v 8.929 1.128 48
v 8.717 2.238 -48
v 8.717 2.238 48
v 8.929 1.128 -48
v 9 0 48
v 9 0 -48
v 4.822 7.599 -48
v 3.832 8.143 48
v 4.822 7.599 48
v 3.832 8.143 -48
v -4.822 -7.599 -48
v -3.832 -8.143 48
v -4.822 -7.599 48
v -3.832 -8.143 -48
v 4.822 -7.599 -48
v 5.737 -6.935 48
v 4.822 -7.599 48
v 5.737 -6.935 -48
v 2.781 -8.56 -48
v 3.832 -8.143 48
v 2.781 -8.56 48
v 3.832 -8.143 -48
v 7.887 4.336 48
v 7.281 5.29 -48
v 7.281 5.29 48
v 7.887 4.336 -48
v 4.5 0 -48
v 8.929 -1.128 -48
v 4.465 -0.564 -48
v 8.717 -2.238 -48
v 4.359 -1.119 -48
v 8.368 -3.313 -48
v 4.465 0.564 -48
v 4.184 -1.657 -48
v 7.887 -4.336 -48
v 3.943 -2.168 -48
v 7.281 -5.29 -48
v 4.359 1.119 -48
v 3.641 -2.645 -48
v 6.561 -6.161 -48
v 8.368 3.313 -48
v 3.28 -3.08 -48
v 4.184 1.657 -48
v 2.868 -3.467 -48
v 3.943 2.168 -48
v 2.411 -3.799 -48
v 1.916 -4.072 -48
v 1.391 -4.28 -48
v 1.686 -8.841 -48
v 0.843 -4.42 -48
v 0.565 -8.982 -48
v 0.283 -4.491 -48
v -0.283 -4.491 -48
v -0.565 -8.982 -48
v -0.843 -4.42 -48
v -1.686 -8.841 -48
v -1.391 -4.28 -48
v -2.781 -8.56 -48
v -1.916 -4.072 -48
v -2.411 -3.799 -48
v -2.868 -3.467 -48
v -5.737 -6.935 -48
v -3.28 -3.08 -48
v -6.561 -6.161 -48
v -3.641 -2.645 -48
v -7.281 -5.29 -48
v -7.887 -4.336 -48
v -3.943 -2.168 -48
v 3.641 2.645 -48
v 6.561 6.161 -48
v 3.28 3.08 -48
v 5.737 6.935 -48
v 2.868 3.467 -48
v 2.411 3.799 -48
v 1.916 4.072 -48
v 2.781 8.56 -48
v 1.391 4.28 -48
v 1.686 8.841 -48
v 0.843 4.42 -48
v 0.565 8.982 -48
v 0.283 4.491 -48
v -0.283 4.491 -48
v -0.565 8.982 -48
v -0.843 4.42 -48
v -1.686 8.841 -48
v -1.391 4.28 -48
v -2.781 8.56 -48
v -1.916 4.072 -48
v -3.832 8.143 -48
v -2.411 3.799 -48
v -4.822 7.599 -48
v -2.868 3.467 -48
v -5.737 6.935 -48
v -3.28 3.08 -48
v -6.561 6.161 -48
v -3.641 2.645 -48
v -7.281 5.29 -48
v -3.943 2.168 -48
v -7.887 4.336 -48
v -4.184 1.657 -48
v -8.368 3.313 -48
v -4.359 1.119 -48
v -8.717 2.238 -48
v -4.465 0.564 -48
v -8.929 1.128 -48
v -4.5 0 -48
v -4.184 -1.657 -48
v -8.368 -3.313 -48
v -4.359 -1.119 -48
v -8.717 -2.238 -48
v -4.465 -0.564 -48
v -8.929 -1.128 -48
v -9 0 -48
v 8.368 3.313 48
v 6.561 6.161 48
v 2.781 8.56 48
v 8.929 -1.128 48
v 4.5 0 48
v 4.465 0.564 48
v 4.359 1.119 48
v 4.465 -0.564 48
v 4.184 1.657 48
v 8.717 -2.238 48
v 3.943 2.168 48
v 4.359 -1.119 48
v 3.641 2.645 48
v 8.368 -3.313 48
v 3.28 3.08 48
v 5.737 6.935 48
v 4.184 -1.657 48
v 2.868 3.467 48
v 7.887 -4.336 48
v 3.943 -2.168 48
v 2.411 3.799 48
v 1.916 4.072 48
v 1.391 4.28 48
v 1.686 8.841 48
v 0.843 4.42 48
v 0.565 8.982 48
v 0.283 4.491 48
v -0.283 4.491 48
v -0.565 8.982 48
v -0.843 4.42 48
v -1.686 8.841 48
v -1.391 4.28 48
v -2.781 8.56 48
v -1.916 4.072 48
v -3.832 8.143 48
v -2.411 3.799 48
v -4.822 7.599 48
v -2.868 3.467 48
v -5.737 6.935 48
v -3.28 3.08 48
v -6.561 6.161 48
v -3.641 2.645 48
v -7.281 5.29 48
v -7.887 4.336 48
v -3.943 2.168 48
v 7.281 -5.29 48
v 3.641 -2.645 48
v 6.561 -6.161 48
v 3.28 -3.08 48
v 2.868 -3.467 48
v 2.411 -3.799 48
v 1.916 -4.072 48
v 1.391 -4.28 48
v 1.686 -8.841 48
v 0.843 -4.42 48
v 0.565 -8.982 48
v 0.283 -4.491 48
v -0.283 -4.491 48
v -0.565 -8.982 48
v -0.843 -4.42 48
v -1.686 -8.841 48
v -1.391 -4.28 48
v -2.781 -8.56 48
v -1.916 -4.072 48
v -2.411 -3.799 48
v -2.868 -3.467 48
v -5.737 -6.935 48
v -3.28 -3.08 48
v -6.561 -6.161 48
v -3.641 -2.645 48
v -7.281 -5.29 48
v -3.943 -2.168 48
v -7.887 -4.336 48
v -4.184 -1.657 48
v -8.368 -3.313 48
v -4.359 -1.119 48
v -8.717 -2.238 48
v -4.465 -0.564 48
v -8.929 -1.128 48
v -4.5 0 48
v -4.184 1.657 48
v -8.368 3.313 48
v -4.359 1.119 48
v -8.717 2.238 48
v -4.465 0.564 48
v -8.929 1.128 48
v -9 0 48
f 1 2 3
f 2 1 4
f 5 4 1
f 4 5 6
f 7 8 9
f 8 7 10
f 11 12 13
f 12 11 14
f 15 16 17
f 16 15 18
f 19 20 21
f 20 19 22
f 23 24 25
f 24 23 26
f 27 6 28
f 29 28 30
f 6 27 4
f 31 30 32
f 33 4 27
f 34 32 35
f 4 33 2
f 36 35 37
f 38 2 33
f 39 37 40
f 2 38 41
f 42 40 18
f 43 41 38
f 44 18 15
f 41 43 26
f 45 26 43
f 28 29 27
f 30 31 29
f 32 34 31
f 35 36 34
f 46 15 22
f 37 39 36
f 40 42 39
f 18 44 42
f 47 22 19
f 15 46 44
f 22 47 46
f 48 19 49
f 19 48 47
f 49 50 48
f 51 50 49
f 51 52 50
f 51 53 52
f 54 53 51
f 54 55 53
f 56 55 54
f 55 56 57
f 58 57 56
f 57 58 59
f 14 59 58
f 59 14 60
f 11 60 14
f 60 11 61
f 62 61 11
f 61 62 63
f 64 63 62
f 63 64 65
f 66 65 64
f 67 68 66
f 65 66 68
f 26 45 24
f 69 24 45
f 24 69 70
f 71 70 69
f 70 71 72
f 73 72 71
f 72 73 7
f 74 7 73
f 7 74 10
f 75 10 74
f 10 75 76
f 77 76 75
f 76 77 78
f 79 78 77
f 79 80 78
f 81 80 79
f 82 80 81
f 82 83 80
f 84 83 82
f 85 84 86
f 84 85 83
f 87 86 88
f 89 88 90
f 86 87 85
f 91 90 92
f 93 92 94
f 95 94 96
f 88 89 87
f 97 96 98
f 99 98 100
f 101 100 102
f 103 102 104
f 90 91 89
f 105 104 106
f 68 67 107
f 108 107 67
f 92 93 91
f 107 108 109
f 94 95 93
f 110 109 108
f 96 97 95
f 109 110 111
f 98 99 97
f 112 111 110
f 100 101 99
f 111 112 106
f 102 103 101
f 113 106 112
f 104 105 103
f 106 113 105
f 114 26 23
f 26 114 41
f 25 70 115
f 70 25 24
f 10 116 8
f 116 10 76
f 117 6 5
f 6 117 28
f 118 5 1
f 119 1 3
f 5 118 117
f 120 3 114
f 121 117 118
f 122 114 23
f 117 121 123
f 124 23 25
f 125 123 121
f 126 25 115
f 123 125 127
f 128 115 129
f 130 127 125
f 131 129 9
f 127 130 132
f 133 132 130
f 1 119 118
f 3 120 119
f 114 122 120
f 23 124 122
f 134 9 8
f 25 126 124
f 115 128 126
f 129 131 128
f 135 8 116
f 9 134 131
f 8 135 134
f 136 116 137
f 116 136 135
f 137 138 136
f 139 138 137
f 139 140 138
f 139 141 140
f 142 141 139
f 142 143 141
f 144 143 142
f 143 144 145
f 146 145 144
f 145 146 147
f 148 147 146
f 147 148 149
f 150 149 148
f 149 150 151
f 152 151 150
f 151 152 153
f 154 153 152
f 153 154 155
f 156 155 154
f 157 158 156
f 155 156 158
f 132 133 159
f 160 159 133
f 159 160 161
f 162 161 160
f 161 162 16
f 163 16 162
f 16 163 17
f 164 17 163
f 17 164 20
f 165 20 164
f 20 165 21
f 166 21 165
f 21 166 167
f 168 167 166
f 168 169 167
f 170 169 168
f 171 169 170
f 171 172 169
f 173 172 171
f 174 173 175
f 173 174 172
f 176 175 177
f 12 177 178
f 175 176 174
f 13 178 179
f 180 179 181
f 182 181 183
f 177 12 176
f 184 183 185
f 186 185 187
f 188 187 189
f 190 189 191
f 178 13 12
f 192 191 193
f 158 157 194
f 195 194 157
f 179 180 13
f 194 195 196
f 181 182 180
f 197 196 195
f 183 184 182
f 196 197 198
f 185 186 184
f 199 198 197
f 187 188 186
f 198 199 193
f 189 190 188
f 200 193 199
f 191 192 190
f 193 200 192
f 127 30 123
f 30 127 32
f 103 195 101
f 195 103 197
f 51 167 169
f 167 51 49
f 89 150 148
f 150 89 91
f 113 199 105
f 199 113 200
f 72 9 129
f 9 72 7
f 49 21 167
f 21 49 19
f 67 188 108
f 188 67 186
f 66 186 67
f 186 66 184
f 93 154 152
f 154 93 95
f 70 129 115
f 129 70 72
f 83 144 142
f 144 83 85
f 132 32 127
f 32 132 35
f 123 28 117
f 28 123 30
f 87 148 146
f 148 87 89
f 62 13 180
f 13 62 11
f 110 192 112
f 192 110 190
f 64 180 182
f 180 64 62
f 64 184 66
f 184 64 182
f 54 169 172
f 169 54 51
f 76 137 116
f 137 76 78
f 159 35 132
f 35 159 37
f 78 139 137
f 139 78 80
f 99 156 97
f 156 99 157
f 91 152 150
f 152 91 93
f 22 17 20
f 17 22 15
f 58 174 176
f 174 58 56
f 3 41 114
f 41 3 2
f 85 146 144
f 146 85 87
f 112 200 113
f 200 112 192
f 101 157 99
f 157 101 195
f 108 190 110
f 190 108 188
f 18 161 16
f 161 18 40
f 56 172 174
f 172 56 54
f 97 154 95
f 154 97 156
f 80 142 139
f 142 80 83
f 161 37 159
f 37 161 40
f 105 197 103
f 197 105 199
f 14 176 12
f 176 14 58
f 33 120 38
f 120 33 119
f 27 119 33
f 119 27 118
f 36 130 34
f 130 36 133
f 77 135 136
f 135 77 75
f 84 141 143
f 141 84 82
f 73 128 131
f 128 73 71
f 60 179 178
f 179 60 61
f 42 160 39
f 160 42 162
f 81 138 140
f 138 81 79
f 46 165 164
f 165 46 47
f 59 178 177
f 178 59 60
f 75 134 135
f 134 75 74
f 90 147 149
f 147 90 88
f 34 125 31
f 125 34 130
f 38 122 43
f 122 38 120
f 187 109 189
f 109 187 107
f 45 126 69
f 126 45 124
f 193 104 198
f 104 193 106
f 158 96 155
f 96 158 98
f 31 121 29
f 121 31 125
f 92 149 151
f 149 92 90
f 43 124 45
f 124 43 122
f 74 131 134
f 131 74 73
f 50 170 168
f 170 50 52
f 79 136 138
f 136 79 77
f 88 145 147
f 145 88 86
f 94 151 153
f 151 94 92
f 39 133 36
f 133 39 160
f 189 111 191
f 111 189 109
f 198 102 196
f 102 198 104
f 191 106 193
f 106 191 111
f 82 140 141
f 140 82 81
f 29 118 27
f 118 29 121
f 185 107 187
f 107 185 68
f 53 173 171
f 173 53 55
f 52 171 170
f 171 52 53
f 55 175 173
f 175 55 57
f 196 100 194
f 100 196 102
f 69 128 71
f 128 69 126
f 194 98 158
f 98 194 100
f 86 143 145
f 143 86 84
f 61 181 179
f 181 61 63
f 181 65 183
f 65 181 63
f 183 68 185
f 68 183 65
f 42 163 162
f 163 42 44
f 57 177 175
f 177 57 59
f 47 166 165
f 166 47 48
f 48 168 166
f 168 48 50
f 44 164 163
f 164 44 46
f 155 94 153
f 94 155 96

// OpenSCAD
$fn = 50;


difference() {
	union() {
		translate(v = [0, 0, -48.0000000000]) {
			cylinder(h = 96, r = 9.0000000000);
		}
	}
	union() {
		translate(v = [0, 0, -100.0000000000]) {
			cylinder(h = 200, r = 4.5000000000);
		}
	}
}
